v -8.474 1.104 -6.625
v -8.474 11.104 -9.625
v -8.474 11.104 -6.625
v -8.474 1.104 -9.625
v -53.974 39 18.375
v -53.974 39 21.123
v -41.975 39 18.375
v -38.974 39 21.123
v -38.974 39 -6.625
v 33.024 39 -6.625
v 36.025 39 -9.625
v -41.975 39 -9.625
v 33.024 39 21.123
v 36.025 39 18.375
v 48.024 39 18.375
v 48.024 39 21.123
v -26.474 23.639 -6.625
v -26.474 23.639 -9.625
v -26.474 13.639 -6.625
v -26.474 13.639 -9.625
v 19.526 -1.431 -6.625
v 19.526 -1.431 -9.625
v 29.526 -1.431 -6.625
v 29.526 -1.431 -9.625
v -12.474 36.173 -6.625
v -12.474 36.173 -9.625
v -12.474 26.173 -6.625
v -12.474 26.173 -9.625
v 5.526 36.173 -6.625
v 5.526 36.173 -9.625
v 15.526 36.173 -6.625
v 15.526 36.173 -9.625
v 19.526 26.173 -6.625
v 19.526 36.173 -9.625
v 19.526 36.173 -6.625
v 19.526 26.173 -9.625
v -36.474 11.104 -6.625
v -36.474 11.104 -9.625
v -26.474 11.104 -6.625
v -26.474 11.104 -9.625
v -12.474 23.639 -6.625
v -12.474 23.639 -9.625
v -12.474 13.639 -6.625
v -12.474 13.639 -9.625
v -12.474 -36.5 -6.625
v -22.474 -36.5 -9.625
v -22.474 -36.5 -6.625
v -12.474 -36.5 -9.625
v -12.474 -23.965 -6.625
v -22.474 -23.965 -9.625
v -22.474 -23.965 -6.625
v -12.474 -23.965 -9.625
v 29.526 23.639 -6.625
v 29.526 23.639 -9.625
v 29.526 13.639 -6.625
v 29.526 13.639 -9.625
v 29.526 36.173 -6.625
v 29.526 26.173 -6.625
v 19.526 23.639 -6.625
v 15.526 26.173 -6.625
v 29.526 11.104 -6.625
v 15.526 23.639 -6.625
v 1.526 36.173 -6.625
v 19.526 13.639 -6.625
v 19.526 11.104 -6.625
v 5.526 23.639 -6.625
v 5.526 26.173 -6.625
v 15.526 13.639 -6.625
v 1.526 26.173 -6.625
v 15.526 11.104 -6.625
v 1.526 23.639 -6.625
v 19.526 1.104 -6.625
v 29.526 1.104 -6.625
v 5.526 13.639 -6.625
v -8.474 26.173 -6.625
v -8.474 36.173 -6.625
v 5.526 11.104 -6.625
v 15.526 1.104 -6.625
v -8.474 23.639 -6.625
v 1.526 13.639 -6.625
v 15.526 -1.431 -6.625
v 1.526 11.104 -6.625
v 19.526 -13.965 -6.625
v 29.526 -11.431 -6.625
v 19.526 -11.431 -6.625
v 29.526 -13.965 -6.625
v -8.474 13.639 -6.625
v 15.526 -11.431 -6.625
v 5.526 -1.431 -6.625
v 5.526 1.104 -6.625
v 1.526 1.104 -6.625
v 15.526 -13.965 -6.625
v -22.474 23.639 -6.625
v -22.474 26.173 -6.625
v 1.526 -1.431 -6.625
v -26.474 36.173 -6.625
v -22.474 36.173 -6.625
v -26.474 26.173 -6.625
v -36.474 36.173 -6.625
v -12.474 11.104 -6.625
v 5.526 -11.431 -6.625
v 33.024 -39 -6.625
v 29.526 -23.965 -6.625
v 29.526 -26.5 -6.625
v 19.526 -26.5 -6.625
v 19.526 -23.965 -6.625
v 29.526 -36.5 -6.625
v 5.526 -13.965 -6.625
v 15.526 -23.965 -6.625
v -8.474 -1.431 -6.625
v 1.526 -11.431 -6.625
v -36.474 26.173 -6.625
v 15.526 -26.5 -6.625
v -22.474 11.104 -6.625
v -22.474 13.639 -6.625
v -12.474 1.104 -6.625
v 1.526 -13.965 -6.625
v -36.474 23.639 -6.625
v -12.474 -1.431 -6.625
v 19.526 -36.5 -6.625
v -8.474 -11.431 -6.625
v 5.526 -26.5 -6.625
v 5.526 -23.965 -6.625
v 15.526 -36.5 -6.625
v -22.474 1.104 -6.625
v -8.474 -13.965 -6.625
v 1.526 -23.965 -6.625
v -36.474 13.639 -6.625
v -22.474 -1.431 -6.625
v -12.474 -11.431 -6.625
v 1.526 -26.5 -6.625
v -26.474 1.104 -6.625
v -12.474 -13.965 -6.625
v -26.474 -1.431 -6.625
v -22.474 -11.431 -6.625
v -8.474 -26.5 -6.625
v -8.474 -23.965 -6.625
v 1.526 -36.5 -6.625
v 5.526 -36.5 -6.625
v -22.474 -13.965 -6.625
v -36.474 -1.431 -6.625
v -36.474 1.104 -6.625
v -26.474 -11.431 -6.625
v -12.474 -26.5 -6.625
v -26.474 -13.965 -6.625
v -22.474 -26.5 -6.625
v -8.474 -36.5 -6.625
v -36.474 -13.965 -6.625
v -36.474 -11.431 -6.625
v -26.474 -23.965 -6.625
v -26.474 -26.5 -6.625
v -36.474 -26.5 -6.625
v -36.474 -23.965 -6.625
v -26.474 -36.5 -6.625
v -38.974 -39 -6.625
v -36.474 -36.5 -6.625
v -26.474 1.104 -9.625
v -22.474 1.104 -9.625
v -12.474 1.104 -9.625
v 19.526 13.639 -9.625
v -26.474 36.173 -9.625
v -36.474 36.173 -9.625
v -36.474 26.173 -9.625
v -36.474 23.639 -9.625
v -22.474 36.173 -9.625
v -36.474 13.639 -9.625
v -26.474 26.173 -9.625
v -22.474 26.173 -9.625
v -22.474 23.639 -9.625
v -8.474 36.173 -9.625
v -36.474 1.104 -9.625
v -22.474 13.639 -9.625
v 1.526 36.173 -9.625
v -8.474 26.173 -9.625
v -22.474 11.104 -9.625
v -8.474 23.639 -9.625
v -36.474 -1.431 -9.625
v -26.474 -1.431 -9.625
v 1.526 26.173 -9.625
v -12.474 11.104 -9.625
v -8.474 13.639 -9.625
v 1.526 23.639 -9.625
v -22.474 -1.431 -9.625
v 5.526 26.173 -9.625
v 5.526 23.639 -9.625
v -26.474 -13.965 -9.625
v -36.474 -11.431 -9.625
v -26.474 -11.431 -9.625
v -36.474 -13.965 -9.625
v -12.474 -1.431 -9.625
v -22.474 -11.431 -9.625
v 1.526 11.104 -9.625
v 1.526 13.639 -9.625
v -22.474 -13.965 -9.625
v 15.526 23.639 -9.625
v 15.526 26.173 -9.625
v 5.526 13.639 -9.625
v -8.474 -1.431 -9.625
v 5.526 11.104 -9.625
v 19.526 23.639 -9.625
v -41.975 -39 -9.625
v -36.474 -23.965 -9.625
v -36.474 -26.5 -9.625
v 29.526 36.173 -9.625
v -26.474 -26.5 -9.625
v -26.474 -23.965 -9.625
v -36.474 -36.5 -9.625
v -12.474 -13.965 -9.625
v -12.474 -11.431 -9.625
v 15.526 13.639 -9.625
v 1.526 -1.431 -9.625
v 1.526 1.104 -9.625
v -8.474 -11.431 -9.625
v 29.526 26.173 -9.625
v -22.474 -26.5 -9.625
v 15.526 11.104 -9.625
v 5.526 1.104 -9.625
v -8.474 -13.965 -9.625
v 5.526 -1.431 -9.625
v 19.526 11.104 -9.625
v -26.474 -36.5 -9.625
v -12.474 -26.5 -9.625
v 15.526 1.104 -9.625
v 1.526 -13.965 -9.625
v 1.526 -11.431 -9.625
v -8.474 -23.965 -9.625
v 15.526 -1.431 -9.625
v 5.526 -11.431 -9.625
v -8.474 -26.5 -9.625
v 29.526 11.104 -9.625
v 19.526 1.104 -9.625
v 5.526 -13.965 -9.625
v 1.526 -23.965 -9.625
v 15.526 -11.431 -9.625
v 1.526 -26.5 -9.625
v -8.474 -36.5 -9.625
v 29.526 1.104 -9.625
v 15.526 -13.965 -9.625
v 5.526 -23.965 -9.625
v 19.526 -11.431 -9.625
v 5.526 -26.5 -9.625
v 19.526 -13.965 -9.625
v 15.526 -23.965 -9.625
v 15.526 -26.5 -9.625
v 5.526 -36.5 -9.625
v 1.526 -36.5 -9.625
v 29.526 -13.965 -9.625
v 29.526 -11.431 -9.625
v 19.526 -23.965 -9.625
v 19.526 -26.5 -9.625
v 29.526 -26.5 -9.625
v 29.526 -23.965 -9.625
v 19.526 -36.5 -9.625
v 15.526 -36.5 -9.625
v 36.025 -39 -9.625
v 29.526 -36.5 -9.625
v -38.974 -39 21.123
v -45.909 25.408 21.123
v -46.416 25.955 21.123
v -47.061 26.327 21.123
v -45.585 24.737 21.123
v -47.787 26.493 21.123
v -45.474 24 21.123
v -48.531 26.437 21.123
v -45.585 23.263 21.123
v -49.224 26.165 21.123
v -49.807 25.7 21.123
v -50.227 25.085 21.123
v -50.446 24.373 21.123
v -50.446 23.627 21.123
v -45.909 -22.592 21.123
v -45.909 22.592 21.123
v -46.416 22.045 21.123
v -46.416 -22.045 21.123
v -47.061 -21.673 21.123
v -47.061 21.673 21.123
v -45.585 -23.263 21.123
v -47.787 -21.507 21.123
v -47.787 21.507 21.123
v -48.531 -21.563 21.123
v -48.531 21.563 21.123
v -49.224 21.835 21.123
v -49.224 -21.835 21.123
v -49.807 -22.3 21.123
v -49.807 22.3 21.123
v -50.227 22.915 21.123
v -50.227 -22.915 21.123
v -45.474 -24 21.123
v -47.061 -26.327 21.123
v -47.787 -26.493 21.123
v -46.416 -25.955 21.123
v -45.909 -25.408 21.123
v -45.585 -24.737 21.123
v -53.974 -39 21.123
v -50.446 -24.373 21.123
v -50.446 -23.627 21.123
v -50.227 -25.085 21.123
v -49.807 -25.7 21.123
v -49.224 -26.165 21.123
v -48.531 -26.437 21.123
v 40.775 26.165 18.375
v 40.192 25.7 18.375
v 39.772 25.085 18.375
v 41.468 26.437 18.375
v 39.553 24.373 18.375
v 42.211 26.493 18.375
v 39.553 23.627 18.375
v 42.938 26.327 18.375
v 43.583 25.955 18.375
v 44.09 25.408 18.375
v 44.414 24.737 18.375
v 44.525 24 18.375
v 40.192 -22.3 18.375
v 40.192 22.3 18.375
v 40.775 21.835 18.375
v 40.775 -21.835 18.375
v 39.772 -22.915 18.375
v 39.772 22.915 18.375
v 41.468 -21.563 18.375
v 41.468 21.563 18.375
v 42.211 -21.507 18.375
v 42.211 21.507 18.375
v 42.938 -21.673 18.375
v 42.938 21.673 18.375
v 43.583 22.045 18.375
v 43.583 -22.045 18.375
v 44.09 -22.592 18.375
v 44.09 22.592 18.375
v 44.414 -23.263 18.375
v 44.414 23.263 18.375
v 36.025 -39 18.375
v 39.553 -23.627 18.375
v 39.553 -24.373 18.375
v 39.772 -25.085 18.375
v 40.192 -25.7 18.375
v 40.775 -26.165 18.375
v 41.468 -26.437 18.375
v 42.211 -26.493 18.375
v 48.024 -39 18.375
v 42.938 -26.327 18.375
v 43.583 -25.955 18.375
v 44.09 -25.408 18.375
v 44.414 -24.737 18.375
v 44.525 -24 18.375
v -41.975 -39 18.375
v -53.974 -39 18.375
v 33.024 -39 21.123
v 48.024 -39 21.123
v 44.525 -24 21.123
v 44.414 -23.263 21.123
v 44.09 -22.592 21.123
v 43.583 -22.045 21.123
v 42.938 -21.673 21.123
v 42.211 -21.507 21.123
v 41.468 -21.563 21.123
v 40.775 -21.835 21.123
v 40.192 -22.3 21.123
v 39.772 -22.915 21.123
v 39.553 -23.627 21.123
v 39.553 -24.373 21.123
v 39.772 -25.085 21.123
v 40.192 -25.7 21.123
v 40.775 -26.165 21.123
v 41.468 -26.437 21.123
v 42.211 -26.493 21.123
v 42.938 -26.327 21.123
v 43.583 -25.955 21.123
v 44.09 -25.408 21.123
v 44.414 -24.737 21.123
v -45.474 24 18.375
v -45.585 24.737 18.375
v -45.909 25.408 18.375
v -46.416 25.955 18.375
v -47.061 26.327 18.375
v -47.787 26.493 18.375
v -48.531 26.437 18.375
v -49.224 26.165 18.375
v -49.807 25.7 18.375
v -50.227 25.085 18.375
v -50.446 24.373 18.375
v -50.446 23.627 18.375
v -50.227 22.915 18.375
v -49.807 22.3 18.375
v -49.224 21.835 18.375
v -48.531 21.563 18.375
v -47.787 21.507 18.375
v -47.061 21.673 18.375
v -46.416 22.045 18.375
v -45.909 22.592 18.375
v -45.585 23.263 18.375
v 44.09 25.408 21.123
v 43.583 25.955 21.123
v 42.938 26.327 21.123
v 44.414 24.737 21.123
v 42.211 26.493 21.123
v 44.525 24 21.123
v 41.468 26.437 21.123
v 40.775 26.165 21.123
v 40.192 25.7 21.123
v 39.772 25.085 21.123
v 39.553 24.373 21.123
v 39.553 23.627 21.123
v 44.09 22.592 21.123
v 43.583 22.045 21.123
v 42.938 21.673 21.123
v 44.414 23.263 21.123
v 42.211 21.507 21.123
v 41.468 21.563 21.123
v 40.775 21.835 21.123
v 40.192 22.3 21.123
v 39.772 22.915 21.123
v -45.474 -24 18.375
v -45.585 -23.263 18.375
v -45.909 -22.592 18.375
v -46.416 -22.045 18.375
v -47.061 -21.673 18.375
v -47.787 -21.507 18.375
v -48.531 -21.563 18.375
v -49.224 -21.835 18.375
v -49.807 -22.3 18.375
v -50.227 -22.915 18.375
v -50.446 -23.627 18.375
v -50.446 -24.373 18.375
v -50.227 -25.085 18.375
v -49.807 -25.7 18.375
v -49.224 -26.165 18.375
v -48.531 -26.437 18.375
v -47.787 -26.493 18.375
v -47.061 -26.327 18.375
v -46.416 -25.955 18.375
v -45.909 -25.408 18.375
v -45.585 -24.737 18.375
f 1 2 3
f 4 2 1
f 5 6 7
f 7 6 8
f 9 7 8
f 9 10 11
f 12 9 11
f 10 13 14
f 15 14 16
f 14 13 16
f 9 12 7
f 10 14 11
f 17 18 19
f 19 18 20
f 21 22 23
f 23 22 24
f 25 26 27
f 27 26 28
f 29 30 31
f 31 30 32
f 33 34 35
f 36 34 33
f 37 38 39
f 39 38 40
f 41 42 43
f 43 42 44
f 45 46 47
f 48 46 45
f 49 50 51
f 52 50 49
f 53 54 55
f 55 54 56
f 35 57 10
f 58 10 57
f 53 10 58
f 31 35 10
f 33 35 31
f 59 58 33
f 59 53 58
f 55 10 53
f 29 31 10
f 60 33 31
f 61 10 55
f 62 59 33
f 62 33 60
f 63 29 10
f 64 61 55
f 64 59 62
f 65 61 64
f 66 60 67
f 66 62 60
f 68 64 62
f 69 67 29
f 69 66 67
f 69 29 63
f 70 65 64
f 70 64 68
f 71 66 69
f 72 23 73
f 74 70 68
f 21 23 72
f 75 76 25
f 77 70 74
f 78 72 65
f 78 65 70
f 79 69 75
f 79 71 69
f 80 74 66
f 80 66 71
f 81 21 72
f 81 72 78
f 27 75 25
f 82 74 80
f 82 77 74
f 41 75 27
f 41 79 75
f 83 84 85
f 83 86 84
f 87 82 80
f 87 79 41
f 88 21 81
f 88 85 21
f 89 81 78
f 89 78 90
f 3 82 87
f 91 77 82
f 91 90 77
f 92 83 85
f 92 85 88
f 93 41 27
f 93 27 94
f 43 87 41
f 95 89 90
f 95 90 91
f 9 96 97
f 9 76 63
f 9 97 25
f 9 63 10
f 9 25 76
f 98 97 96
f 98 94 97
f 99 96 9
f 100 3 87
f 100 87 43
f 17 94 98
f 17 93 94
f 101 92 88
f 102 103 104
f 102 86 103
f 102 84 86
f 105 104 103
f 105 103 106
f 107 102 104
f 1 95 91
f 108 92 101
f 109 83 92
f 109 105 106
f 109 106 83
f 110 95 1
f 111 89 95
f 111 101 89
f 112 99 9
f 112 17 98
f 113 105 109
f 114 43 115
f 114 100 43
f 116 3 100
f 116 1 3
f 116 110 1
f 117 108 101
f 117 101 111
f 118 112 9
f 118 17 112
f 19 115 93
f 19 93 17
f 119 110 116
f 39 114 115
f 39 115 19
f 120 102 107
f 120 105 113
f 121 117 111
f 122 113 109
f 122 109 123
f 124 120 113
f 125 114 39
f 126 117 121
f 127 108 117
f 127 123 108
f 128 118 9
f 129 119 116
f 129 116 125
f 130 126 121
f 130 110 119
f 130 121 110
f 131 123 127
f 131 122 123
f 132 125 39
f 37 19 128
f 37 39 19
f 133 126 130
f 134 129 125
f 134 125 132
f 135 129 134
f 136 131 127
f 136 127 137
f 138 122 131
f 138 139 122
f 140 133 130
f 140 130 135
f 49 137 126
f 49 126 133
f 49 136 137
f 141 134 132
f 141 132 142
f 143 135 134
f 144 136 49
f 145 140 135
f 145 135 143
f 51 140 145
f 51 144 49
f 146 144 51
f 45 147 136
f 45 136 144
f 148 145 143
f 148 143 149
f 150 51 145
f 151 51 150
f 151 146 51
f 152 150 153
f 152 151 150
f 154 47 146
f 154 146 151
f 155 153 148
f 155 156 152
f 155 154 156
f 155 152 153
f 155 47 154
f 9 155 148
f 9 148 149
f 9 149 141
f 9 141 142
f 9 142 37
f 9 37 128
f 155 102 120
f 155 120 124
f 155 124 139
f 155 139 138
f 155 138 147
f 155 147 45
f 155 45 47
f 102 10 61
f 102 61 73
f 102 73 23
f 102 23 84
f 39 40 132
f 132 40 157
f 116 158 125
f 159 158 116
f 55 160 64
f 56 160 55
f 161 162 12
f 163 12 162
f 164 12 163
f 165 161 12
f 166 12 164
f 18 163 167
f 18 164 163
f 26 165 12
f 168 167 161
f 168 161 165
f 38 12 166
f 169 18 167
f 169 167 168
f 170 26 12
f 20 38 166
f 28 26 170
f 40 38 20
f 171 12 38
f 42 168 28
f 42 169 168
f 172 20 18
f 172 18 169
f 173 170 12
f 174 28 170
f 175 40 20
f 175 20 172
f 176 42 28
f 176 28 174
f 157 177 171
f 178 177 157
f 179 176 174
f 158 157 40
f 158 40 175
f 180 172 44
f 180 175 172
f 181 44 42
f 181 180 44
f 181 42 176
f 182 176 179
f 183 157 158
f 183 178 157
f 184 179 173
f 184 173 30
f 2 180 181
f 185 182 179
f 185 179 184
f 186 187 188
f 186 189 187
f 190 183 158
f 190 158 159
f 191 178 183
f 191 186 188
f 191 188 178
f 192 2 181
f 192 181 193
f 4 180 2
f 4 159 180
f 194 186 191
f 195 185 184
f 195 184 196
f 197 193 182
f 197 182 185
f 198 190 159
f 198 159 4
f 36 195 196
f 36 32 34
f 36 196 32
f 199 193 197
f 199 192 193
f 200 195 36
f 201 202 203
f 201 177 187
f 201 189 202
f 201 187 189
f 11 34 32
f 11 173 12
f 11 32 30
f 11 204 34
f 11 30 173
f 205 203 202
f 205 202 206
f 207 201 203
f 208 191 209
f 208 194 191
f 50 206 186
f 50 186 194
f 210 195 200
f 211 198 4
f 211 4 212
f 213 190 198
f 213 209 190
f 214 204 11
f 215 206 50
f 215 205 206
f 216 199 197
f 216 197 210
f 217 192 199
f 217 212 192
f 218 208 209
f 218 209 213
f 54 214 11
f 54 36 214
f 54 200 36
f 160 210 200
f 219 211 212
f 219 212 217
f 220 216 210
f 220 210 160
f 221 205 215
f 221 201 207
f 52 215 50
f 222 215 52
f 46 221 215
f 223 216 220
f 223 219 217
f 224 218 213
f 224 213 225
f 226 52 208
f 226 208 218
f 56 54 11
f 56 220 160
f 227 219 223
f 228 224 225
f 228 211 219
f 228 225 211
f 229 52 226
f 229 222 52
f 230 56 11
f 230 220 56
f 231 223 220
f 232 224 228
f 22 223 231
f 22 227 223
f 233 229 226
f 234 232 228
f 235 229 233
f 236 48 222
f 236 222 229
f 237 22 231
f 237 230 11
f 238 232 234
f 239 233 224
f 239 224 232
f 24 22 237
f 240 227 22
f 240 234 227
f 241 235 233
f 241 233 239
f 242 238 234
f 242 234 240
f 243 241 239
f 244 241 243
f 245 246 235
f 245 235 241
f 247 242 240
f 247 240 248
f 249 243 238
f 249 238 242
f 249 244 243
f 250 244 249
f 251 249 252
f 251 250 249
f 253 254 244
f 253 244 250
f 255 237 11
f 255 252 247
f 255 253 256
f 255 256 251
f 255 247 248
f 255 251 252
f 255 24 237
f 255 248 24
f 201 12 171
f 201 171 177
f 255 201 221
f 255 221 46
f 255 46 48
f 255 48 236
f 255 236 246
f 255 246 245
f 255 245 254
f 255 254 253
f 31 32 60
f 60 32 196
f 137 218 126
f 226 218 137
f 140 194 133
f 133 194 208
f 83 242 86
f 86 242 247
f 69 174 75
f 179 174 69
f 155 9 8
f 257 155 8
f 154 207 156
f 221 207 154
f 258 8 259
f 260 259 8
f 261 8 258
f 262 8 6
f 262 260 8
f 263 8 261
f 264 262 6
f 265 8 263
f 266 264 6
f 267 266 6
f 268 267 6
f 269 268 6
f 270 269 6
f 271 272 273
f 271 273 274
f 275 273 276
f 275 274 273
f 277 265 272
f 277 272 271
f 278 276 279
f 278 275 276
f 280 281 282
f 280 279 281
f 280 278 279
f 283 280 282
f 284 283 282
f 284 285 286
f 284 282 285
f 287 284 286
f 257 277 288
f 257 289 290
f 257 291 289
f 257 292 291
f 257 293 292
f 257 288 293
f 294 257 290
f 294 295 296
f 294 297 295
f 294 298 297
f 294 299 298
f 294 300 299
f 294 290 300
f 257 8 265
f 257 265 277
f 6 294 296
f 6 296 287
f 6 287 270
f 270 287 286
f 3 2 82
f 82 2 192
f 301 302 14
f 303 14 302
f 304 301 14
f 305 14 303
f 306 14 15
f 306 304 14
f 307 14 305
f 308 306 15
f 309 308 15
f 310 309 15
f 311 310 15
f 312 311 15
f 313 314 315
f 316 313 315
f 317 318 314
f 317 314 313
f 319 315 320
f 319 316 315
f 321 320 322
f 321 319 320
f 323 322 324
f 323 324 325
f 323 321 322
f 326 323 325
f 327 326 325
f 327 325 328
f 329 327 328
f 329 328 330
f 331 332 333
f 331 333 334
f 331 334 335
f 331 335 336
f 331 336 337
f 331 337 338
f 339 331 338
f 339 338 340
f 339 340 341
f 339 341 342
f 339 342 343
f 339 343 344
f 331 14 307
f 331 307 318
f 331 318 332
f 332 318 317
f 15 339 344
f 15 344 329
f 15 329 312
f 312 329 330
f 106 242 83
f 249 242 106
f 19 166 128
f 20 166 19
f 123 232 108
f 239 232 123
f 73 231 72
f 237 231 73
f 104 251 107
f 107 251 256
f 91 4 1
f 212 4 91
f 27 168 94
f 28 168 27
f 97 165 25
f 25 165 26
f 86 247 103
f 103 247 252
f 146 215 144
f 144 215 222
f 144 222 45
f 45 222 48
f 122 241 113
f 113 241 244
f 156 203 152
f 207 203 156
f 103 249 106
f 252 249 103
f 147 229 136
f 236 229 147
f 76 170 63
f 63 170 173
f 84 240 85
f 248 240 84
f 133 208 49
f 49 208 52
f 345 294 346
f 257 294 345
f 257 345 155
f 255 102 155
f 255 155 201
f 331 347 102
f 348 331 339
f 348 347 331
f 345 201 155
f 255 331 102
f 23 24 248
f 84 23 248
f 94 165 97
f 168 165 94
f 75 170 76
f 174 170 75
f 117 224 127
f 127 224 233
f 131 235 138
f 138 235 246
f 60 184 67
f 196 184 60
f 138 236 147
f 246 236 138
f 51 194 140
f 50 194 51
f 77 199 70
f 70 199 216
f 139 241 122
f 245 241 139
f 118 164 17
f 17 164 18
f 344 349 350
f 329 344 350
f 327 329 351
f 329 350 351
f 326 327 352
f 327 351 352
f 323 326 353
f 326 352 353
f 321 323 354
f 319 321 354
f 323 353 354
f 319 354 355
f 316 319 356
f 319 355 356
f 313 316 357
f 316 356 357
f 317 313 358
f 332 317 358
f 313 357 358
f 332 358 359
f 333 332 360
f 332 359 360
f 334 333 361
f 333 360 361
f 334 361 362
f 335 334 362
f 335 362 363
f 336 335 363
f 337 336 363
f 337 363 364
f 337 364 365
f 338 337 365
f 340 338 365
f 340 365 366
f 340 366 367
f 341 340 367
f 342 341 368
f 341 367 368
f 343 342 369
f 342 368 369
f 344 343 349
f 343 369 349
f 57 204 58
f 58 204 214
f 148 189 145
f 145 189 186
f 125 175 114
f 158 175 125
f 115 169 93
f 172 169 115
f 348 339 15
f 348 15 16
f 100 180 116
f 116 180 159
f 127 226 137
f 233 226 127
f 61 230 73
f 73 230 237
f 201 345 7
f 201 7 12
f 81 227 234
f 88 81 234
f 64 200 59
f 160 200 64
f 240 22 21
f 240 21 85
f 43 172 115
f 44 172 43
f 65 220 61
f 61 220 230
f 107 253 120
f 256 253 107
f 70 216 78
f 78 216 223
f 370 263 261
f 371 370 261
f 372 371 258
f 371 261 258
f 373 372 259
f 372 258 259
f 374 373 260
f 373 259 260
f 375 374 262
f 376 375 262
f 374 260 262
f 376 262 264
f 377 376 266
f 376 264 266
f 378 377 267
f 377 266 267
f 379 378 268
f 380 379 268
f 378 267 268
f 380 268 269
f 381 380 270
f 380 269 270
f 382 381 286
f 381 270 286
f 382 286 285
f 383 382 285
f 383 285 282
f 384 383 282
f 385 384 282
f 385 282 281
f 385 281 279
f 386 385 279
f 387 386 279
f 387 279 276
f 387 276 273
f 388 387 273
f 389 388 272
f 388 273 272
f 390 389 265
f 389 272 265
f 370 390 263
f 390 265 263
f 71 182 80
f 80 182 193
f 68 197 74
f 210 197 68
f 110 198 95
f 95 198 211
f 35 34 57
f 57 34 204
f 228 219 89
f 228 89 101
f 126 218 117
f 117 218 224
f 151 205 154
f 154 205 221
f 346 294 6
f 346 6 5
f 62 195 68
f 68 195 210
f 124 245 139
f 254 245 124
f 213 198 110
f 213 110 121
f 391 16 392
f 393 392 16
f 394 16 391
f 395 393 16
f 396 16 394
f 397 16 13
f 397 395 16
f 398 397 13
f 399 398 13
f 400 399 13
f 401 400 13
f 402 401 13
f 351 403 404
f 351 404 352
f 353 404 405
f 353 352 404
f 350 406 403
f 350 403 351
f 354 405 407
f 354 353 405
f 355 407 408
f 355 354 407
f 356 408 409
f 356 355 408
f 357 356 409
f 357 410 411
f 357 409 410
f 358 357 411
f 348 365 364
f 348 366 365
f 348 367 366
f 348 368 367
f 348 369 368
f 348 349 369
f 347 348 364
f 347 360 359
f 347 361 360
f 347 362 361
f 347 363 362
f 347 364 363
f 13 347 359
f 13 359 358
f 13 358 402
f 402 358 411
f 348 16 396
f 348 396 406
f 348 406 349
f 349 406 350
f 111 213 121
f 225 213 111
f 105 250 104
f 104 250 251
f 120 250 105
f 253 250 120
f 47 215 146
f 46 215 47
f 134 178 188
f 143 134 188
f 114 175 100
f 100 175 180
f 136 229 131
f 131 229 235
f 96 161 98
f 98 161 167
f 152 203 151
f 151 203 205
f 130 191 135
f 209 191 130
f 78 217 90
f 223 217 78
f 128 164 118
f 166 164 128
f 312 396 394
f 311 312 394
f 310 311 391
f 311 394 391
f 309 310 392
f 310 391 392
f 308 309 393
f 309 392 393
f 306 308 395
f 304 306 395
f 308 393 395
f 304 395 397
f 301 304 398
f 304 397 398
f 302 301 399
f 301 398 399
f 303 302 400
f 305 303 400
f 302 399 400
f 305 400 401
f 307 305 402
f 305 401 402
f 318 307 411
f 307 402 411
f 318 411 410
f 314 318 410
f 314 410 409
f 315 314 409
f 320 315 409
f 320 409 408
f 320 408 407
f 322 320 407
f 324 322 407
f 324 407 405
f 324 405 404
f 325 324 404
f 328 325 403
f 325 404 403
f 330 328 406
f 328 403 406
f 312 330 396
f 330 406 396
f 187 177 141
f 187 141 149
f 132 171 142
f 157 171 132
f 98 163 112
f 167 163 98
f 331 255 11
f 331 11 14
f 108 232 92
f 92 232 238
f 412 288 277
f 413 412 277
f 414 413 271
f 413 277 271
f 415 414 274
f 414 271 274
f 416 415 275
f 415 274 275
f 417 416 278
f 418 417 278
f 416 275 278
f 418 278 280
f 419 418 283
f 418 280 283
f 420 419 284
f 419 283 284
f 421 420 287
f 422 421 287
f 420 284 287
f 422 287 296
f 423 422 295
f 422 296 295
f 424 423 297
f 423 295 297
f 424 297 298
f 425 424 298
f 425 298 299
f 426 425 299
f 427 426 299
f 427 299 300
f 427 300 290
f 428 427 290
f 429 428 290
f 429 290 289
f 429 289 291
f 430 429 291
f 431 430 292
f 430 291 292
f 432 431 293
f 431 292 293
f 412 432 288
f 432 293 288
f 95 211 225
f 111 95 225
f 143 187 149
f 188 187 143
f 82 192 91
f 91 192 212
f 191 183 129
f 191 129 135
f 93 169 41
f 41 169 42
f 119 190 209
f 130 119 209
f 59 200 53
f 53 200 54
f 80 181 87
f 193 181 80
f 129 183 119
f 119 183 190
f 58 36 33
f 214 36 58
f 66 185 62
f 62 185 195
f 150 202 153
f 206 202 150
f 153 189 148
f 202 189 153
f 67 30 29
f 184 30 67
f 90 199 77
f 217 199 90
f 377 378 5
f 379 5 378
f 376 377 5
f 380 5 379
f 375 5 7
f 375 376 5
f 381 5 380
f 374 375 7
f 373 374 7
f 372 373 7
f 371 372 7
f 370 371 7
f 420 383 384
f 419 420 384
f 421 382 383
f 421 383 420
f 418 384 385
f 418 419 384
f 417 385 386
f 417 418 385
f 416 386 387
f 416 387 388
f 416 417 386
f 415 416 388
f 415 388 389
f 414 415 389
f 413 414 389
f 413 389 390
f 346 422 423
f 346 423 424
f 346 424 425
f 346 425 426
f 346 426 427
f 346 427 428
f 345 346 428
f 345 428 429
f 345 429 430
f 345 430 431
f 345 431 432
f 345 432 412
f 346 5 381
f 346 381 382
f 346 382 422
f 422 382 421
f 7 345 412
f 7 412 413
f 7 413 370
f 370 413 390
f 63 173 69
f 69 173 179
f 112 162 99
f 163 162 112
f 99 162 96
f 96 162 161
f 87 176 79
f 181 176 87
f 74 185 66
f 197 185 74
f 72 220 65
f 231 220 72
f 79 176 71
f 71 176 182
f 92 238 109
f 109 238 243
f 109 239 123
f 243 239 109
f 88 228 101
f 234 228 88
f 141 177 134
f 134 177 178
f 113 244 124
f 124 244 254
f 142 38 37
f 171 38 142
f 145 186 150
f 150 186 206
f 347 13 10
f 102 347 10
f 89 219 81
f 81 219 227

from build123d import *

# Parameters (mm, degrees)
F1_DEPTH = 39
F2_R     = 2.5
F3_DEPTH = 2.748387
F4_W     = 10
F4_H     = 10
F5_DEPTH = 3


with BuildPart() as f1:
    # F0 (on Front) → F1 (new body, symmetric)
    with BuildSketch(Plane.XZ):
        Polygon((33.024074, -6.624926), (-2.974825, -6.624926), (-2.974825, -9.624926), (36.025175, -9.624926), (36.025175, 18.375074), (48.024074, 18.375074), (48.024074, 21.123461), (33.024074, 21.123461), align=None)
        Polygon((-2.974825, -9.624926), (-2.974825, -6.624926), (-38.973723, -6.624926), (-38.973723, 21.123461), (-53.973723, 21.123461), (-53.973723, 18.375074), (-41.974825, 18.375074), (-41.974825, -9.624926), align=None)
    extrude(amount=F1_DEPTH, both=True)

    # F2 (on face) → F3 (cut, through all)
    with BuildSketch(Plane.XY.offset(21.123461)):
        with Locations((42.024624, -24)):
            Circle(F2_R)
        with Locations((42.024624, 24)):
            Circle(F2_R)
        with Locations((-47.974274, 24)):
            Circle(F2_R)
        with Locations((-47.974274, -24)):
            Circle(F2_R)
    extrude(amount=-F3_DEPTH, mode=Mode.SUBTRACT)

    # F4 (on face) → F5 (cut, through all)
    with BuildSketch(Plane(origin=(0, 0, -9.624926), x_dir=(1, 0, 0), z_dir=(0, 0, -1))):
        with Locations((-31.473723, 31.5)):
            Rectangle(F4_W, F4_H)
        with Locations((-17.473723, 31.5)):
            Rectangle(F4_W, F4_H)
        with Locations((-3.473723, 31.5)):
            Rectangle(F4_W, F4_H)
        with Locations((10.526277, 31.5)):
            Rectangle(F4_W, F4_H)
        with Locations((24.526277, 31.5)):
            Rectangle(F4_W, F4_H)
        with Locations((10.526277, 18.965352)):
            Rectangle(F4_W, F4_H)
        with Locations((24.526277, 18.965352)):
            Rectangle(F4_W, F4_H)
        with Locations((-31.473723, 18.965352)):
            Rectangle(F4_W, F4_H)
        with Locations((-17.473723, 18.965352)):
            Rectangle(F4_W, F4_H)
        with Locations((-3.473723, 18.965352)):
            Rectangle(F4_W, F4_H)
        with Locations((10.526277, 6.430703)):
            Rectangle(F4_W, F4_H)
        with Locations((24.526277, 6.430703)):
            Rectangle(F4_W, F4_H)
        with Locations((-31.473723, 6.430703)):
            Rectangle(F4_W, F4_H)
        with Locations((-17.473723, 6.430703)):
            Rectangle(F4_W, F4_H)
        with Locations((-3.473723, 6.430703)):
            Rectangle(F4_W, F4_H)
        with Locations((10.526277, -6.103945)):
            Rectangle(F4_W, F4_H)
        with Locations((24.526277, -6.103945)):
            Rectangle(F4_W, F4_H)
        with Locations((-31.473723, -6.103945)):
            Rectangle(F4_W, F4_H)
        with Locations((-17.473723, -6.103945)):
            Rectangle(F4_W, F4_H)
        with Locations((-3.473723, -6.103945)):
            Rectangle(F4_W, F4_H)
        with Locations((10.526277, -18.638594)):
            Rectangle(F4_W, F4_H)
        with Locations((24.526277, -18.638594)):
            Rectangle(F4_W, F4_H)
        with Locations((-31.473723, -18.638594)):
            Rectangle(F4_W, F4_H)
        with Locations((-17.473723, -18.638594)):
            Rectangle(F4_W, F4_H)
        with Locations((-3.473723, -18.638594)):
            Rectangle(F4_W, F4_H)
        with Locations((10.526277, -31.173242)):
            Rectangle(F4_W, F4_H)
        with Locations((24.526277, -31.173242)):
            Rectangle(F4_W, F4_H)
        with Locations((-31.473723, -31.173242)):
            Rectangle(F4_W, F4_H)
        with Locations((-17.473723, -31.173242)):
            Rectangle(F4_W, F4_H)
        with Locations((-3.473723, -31.173242)):
            Rectangle(F4_W, F4_H)
    extrude(amount=-F5_DEPTH, mode=Mode.SUBTRACT)


solid = f1.part
